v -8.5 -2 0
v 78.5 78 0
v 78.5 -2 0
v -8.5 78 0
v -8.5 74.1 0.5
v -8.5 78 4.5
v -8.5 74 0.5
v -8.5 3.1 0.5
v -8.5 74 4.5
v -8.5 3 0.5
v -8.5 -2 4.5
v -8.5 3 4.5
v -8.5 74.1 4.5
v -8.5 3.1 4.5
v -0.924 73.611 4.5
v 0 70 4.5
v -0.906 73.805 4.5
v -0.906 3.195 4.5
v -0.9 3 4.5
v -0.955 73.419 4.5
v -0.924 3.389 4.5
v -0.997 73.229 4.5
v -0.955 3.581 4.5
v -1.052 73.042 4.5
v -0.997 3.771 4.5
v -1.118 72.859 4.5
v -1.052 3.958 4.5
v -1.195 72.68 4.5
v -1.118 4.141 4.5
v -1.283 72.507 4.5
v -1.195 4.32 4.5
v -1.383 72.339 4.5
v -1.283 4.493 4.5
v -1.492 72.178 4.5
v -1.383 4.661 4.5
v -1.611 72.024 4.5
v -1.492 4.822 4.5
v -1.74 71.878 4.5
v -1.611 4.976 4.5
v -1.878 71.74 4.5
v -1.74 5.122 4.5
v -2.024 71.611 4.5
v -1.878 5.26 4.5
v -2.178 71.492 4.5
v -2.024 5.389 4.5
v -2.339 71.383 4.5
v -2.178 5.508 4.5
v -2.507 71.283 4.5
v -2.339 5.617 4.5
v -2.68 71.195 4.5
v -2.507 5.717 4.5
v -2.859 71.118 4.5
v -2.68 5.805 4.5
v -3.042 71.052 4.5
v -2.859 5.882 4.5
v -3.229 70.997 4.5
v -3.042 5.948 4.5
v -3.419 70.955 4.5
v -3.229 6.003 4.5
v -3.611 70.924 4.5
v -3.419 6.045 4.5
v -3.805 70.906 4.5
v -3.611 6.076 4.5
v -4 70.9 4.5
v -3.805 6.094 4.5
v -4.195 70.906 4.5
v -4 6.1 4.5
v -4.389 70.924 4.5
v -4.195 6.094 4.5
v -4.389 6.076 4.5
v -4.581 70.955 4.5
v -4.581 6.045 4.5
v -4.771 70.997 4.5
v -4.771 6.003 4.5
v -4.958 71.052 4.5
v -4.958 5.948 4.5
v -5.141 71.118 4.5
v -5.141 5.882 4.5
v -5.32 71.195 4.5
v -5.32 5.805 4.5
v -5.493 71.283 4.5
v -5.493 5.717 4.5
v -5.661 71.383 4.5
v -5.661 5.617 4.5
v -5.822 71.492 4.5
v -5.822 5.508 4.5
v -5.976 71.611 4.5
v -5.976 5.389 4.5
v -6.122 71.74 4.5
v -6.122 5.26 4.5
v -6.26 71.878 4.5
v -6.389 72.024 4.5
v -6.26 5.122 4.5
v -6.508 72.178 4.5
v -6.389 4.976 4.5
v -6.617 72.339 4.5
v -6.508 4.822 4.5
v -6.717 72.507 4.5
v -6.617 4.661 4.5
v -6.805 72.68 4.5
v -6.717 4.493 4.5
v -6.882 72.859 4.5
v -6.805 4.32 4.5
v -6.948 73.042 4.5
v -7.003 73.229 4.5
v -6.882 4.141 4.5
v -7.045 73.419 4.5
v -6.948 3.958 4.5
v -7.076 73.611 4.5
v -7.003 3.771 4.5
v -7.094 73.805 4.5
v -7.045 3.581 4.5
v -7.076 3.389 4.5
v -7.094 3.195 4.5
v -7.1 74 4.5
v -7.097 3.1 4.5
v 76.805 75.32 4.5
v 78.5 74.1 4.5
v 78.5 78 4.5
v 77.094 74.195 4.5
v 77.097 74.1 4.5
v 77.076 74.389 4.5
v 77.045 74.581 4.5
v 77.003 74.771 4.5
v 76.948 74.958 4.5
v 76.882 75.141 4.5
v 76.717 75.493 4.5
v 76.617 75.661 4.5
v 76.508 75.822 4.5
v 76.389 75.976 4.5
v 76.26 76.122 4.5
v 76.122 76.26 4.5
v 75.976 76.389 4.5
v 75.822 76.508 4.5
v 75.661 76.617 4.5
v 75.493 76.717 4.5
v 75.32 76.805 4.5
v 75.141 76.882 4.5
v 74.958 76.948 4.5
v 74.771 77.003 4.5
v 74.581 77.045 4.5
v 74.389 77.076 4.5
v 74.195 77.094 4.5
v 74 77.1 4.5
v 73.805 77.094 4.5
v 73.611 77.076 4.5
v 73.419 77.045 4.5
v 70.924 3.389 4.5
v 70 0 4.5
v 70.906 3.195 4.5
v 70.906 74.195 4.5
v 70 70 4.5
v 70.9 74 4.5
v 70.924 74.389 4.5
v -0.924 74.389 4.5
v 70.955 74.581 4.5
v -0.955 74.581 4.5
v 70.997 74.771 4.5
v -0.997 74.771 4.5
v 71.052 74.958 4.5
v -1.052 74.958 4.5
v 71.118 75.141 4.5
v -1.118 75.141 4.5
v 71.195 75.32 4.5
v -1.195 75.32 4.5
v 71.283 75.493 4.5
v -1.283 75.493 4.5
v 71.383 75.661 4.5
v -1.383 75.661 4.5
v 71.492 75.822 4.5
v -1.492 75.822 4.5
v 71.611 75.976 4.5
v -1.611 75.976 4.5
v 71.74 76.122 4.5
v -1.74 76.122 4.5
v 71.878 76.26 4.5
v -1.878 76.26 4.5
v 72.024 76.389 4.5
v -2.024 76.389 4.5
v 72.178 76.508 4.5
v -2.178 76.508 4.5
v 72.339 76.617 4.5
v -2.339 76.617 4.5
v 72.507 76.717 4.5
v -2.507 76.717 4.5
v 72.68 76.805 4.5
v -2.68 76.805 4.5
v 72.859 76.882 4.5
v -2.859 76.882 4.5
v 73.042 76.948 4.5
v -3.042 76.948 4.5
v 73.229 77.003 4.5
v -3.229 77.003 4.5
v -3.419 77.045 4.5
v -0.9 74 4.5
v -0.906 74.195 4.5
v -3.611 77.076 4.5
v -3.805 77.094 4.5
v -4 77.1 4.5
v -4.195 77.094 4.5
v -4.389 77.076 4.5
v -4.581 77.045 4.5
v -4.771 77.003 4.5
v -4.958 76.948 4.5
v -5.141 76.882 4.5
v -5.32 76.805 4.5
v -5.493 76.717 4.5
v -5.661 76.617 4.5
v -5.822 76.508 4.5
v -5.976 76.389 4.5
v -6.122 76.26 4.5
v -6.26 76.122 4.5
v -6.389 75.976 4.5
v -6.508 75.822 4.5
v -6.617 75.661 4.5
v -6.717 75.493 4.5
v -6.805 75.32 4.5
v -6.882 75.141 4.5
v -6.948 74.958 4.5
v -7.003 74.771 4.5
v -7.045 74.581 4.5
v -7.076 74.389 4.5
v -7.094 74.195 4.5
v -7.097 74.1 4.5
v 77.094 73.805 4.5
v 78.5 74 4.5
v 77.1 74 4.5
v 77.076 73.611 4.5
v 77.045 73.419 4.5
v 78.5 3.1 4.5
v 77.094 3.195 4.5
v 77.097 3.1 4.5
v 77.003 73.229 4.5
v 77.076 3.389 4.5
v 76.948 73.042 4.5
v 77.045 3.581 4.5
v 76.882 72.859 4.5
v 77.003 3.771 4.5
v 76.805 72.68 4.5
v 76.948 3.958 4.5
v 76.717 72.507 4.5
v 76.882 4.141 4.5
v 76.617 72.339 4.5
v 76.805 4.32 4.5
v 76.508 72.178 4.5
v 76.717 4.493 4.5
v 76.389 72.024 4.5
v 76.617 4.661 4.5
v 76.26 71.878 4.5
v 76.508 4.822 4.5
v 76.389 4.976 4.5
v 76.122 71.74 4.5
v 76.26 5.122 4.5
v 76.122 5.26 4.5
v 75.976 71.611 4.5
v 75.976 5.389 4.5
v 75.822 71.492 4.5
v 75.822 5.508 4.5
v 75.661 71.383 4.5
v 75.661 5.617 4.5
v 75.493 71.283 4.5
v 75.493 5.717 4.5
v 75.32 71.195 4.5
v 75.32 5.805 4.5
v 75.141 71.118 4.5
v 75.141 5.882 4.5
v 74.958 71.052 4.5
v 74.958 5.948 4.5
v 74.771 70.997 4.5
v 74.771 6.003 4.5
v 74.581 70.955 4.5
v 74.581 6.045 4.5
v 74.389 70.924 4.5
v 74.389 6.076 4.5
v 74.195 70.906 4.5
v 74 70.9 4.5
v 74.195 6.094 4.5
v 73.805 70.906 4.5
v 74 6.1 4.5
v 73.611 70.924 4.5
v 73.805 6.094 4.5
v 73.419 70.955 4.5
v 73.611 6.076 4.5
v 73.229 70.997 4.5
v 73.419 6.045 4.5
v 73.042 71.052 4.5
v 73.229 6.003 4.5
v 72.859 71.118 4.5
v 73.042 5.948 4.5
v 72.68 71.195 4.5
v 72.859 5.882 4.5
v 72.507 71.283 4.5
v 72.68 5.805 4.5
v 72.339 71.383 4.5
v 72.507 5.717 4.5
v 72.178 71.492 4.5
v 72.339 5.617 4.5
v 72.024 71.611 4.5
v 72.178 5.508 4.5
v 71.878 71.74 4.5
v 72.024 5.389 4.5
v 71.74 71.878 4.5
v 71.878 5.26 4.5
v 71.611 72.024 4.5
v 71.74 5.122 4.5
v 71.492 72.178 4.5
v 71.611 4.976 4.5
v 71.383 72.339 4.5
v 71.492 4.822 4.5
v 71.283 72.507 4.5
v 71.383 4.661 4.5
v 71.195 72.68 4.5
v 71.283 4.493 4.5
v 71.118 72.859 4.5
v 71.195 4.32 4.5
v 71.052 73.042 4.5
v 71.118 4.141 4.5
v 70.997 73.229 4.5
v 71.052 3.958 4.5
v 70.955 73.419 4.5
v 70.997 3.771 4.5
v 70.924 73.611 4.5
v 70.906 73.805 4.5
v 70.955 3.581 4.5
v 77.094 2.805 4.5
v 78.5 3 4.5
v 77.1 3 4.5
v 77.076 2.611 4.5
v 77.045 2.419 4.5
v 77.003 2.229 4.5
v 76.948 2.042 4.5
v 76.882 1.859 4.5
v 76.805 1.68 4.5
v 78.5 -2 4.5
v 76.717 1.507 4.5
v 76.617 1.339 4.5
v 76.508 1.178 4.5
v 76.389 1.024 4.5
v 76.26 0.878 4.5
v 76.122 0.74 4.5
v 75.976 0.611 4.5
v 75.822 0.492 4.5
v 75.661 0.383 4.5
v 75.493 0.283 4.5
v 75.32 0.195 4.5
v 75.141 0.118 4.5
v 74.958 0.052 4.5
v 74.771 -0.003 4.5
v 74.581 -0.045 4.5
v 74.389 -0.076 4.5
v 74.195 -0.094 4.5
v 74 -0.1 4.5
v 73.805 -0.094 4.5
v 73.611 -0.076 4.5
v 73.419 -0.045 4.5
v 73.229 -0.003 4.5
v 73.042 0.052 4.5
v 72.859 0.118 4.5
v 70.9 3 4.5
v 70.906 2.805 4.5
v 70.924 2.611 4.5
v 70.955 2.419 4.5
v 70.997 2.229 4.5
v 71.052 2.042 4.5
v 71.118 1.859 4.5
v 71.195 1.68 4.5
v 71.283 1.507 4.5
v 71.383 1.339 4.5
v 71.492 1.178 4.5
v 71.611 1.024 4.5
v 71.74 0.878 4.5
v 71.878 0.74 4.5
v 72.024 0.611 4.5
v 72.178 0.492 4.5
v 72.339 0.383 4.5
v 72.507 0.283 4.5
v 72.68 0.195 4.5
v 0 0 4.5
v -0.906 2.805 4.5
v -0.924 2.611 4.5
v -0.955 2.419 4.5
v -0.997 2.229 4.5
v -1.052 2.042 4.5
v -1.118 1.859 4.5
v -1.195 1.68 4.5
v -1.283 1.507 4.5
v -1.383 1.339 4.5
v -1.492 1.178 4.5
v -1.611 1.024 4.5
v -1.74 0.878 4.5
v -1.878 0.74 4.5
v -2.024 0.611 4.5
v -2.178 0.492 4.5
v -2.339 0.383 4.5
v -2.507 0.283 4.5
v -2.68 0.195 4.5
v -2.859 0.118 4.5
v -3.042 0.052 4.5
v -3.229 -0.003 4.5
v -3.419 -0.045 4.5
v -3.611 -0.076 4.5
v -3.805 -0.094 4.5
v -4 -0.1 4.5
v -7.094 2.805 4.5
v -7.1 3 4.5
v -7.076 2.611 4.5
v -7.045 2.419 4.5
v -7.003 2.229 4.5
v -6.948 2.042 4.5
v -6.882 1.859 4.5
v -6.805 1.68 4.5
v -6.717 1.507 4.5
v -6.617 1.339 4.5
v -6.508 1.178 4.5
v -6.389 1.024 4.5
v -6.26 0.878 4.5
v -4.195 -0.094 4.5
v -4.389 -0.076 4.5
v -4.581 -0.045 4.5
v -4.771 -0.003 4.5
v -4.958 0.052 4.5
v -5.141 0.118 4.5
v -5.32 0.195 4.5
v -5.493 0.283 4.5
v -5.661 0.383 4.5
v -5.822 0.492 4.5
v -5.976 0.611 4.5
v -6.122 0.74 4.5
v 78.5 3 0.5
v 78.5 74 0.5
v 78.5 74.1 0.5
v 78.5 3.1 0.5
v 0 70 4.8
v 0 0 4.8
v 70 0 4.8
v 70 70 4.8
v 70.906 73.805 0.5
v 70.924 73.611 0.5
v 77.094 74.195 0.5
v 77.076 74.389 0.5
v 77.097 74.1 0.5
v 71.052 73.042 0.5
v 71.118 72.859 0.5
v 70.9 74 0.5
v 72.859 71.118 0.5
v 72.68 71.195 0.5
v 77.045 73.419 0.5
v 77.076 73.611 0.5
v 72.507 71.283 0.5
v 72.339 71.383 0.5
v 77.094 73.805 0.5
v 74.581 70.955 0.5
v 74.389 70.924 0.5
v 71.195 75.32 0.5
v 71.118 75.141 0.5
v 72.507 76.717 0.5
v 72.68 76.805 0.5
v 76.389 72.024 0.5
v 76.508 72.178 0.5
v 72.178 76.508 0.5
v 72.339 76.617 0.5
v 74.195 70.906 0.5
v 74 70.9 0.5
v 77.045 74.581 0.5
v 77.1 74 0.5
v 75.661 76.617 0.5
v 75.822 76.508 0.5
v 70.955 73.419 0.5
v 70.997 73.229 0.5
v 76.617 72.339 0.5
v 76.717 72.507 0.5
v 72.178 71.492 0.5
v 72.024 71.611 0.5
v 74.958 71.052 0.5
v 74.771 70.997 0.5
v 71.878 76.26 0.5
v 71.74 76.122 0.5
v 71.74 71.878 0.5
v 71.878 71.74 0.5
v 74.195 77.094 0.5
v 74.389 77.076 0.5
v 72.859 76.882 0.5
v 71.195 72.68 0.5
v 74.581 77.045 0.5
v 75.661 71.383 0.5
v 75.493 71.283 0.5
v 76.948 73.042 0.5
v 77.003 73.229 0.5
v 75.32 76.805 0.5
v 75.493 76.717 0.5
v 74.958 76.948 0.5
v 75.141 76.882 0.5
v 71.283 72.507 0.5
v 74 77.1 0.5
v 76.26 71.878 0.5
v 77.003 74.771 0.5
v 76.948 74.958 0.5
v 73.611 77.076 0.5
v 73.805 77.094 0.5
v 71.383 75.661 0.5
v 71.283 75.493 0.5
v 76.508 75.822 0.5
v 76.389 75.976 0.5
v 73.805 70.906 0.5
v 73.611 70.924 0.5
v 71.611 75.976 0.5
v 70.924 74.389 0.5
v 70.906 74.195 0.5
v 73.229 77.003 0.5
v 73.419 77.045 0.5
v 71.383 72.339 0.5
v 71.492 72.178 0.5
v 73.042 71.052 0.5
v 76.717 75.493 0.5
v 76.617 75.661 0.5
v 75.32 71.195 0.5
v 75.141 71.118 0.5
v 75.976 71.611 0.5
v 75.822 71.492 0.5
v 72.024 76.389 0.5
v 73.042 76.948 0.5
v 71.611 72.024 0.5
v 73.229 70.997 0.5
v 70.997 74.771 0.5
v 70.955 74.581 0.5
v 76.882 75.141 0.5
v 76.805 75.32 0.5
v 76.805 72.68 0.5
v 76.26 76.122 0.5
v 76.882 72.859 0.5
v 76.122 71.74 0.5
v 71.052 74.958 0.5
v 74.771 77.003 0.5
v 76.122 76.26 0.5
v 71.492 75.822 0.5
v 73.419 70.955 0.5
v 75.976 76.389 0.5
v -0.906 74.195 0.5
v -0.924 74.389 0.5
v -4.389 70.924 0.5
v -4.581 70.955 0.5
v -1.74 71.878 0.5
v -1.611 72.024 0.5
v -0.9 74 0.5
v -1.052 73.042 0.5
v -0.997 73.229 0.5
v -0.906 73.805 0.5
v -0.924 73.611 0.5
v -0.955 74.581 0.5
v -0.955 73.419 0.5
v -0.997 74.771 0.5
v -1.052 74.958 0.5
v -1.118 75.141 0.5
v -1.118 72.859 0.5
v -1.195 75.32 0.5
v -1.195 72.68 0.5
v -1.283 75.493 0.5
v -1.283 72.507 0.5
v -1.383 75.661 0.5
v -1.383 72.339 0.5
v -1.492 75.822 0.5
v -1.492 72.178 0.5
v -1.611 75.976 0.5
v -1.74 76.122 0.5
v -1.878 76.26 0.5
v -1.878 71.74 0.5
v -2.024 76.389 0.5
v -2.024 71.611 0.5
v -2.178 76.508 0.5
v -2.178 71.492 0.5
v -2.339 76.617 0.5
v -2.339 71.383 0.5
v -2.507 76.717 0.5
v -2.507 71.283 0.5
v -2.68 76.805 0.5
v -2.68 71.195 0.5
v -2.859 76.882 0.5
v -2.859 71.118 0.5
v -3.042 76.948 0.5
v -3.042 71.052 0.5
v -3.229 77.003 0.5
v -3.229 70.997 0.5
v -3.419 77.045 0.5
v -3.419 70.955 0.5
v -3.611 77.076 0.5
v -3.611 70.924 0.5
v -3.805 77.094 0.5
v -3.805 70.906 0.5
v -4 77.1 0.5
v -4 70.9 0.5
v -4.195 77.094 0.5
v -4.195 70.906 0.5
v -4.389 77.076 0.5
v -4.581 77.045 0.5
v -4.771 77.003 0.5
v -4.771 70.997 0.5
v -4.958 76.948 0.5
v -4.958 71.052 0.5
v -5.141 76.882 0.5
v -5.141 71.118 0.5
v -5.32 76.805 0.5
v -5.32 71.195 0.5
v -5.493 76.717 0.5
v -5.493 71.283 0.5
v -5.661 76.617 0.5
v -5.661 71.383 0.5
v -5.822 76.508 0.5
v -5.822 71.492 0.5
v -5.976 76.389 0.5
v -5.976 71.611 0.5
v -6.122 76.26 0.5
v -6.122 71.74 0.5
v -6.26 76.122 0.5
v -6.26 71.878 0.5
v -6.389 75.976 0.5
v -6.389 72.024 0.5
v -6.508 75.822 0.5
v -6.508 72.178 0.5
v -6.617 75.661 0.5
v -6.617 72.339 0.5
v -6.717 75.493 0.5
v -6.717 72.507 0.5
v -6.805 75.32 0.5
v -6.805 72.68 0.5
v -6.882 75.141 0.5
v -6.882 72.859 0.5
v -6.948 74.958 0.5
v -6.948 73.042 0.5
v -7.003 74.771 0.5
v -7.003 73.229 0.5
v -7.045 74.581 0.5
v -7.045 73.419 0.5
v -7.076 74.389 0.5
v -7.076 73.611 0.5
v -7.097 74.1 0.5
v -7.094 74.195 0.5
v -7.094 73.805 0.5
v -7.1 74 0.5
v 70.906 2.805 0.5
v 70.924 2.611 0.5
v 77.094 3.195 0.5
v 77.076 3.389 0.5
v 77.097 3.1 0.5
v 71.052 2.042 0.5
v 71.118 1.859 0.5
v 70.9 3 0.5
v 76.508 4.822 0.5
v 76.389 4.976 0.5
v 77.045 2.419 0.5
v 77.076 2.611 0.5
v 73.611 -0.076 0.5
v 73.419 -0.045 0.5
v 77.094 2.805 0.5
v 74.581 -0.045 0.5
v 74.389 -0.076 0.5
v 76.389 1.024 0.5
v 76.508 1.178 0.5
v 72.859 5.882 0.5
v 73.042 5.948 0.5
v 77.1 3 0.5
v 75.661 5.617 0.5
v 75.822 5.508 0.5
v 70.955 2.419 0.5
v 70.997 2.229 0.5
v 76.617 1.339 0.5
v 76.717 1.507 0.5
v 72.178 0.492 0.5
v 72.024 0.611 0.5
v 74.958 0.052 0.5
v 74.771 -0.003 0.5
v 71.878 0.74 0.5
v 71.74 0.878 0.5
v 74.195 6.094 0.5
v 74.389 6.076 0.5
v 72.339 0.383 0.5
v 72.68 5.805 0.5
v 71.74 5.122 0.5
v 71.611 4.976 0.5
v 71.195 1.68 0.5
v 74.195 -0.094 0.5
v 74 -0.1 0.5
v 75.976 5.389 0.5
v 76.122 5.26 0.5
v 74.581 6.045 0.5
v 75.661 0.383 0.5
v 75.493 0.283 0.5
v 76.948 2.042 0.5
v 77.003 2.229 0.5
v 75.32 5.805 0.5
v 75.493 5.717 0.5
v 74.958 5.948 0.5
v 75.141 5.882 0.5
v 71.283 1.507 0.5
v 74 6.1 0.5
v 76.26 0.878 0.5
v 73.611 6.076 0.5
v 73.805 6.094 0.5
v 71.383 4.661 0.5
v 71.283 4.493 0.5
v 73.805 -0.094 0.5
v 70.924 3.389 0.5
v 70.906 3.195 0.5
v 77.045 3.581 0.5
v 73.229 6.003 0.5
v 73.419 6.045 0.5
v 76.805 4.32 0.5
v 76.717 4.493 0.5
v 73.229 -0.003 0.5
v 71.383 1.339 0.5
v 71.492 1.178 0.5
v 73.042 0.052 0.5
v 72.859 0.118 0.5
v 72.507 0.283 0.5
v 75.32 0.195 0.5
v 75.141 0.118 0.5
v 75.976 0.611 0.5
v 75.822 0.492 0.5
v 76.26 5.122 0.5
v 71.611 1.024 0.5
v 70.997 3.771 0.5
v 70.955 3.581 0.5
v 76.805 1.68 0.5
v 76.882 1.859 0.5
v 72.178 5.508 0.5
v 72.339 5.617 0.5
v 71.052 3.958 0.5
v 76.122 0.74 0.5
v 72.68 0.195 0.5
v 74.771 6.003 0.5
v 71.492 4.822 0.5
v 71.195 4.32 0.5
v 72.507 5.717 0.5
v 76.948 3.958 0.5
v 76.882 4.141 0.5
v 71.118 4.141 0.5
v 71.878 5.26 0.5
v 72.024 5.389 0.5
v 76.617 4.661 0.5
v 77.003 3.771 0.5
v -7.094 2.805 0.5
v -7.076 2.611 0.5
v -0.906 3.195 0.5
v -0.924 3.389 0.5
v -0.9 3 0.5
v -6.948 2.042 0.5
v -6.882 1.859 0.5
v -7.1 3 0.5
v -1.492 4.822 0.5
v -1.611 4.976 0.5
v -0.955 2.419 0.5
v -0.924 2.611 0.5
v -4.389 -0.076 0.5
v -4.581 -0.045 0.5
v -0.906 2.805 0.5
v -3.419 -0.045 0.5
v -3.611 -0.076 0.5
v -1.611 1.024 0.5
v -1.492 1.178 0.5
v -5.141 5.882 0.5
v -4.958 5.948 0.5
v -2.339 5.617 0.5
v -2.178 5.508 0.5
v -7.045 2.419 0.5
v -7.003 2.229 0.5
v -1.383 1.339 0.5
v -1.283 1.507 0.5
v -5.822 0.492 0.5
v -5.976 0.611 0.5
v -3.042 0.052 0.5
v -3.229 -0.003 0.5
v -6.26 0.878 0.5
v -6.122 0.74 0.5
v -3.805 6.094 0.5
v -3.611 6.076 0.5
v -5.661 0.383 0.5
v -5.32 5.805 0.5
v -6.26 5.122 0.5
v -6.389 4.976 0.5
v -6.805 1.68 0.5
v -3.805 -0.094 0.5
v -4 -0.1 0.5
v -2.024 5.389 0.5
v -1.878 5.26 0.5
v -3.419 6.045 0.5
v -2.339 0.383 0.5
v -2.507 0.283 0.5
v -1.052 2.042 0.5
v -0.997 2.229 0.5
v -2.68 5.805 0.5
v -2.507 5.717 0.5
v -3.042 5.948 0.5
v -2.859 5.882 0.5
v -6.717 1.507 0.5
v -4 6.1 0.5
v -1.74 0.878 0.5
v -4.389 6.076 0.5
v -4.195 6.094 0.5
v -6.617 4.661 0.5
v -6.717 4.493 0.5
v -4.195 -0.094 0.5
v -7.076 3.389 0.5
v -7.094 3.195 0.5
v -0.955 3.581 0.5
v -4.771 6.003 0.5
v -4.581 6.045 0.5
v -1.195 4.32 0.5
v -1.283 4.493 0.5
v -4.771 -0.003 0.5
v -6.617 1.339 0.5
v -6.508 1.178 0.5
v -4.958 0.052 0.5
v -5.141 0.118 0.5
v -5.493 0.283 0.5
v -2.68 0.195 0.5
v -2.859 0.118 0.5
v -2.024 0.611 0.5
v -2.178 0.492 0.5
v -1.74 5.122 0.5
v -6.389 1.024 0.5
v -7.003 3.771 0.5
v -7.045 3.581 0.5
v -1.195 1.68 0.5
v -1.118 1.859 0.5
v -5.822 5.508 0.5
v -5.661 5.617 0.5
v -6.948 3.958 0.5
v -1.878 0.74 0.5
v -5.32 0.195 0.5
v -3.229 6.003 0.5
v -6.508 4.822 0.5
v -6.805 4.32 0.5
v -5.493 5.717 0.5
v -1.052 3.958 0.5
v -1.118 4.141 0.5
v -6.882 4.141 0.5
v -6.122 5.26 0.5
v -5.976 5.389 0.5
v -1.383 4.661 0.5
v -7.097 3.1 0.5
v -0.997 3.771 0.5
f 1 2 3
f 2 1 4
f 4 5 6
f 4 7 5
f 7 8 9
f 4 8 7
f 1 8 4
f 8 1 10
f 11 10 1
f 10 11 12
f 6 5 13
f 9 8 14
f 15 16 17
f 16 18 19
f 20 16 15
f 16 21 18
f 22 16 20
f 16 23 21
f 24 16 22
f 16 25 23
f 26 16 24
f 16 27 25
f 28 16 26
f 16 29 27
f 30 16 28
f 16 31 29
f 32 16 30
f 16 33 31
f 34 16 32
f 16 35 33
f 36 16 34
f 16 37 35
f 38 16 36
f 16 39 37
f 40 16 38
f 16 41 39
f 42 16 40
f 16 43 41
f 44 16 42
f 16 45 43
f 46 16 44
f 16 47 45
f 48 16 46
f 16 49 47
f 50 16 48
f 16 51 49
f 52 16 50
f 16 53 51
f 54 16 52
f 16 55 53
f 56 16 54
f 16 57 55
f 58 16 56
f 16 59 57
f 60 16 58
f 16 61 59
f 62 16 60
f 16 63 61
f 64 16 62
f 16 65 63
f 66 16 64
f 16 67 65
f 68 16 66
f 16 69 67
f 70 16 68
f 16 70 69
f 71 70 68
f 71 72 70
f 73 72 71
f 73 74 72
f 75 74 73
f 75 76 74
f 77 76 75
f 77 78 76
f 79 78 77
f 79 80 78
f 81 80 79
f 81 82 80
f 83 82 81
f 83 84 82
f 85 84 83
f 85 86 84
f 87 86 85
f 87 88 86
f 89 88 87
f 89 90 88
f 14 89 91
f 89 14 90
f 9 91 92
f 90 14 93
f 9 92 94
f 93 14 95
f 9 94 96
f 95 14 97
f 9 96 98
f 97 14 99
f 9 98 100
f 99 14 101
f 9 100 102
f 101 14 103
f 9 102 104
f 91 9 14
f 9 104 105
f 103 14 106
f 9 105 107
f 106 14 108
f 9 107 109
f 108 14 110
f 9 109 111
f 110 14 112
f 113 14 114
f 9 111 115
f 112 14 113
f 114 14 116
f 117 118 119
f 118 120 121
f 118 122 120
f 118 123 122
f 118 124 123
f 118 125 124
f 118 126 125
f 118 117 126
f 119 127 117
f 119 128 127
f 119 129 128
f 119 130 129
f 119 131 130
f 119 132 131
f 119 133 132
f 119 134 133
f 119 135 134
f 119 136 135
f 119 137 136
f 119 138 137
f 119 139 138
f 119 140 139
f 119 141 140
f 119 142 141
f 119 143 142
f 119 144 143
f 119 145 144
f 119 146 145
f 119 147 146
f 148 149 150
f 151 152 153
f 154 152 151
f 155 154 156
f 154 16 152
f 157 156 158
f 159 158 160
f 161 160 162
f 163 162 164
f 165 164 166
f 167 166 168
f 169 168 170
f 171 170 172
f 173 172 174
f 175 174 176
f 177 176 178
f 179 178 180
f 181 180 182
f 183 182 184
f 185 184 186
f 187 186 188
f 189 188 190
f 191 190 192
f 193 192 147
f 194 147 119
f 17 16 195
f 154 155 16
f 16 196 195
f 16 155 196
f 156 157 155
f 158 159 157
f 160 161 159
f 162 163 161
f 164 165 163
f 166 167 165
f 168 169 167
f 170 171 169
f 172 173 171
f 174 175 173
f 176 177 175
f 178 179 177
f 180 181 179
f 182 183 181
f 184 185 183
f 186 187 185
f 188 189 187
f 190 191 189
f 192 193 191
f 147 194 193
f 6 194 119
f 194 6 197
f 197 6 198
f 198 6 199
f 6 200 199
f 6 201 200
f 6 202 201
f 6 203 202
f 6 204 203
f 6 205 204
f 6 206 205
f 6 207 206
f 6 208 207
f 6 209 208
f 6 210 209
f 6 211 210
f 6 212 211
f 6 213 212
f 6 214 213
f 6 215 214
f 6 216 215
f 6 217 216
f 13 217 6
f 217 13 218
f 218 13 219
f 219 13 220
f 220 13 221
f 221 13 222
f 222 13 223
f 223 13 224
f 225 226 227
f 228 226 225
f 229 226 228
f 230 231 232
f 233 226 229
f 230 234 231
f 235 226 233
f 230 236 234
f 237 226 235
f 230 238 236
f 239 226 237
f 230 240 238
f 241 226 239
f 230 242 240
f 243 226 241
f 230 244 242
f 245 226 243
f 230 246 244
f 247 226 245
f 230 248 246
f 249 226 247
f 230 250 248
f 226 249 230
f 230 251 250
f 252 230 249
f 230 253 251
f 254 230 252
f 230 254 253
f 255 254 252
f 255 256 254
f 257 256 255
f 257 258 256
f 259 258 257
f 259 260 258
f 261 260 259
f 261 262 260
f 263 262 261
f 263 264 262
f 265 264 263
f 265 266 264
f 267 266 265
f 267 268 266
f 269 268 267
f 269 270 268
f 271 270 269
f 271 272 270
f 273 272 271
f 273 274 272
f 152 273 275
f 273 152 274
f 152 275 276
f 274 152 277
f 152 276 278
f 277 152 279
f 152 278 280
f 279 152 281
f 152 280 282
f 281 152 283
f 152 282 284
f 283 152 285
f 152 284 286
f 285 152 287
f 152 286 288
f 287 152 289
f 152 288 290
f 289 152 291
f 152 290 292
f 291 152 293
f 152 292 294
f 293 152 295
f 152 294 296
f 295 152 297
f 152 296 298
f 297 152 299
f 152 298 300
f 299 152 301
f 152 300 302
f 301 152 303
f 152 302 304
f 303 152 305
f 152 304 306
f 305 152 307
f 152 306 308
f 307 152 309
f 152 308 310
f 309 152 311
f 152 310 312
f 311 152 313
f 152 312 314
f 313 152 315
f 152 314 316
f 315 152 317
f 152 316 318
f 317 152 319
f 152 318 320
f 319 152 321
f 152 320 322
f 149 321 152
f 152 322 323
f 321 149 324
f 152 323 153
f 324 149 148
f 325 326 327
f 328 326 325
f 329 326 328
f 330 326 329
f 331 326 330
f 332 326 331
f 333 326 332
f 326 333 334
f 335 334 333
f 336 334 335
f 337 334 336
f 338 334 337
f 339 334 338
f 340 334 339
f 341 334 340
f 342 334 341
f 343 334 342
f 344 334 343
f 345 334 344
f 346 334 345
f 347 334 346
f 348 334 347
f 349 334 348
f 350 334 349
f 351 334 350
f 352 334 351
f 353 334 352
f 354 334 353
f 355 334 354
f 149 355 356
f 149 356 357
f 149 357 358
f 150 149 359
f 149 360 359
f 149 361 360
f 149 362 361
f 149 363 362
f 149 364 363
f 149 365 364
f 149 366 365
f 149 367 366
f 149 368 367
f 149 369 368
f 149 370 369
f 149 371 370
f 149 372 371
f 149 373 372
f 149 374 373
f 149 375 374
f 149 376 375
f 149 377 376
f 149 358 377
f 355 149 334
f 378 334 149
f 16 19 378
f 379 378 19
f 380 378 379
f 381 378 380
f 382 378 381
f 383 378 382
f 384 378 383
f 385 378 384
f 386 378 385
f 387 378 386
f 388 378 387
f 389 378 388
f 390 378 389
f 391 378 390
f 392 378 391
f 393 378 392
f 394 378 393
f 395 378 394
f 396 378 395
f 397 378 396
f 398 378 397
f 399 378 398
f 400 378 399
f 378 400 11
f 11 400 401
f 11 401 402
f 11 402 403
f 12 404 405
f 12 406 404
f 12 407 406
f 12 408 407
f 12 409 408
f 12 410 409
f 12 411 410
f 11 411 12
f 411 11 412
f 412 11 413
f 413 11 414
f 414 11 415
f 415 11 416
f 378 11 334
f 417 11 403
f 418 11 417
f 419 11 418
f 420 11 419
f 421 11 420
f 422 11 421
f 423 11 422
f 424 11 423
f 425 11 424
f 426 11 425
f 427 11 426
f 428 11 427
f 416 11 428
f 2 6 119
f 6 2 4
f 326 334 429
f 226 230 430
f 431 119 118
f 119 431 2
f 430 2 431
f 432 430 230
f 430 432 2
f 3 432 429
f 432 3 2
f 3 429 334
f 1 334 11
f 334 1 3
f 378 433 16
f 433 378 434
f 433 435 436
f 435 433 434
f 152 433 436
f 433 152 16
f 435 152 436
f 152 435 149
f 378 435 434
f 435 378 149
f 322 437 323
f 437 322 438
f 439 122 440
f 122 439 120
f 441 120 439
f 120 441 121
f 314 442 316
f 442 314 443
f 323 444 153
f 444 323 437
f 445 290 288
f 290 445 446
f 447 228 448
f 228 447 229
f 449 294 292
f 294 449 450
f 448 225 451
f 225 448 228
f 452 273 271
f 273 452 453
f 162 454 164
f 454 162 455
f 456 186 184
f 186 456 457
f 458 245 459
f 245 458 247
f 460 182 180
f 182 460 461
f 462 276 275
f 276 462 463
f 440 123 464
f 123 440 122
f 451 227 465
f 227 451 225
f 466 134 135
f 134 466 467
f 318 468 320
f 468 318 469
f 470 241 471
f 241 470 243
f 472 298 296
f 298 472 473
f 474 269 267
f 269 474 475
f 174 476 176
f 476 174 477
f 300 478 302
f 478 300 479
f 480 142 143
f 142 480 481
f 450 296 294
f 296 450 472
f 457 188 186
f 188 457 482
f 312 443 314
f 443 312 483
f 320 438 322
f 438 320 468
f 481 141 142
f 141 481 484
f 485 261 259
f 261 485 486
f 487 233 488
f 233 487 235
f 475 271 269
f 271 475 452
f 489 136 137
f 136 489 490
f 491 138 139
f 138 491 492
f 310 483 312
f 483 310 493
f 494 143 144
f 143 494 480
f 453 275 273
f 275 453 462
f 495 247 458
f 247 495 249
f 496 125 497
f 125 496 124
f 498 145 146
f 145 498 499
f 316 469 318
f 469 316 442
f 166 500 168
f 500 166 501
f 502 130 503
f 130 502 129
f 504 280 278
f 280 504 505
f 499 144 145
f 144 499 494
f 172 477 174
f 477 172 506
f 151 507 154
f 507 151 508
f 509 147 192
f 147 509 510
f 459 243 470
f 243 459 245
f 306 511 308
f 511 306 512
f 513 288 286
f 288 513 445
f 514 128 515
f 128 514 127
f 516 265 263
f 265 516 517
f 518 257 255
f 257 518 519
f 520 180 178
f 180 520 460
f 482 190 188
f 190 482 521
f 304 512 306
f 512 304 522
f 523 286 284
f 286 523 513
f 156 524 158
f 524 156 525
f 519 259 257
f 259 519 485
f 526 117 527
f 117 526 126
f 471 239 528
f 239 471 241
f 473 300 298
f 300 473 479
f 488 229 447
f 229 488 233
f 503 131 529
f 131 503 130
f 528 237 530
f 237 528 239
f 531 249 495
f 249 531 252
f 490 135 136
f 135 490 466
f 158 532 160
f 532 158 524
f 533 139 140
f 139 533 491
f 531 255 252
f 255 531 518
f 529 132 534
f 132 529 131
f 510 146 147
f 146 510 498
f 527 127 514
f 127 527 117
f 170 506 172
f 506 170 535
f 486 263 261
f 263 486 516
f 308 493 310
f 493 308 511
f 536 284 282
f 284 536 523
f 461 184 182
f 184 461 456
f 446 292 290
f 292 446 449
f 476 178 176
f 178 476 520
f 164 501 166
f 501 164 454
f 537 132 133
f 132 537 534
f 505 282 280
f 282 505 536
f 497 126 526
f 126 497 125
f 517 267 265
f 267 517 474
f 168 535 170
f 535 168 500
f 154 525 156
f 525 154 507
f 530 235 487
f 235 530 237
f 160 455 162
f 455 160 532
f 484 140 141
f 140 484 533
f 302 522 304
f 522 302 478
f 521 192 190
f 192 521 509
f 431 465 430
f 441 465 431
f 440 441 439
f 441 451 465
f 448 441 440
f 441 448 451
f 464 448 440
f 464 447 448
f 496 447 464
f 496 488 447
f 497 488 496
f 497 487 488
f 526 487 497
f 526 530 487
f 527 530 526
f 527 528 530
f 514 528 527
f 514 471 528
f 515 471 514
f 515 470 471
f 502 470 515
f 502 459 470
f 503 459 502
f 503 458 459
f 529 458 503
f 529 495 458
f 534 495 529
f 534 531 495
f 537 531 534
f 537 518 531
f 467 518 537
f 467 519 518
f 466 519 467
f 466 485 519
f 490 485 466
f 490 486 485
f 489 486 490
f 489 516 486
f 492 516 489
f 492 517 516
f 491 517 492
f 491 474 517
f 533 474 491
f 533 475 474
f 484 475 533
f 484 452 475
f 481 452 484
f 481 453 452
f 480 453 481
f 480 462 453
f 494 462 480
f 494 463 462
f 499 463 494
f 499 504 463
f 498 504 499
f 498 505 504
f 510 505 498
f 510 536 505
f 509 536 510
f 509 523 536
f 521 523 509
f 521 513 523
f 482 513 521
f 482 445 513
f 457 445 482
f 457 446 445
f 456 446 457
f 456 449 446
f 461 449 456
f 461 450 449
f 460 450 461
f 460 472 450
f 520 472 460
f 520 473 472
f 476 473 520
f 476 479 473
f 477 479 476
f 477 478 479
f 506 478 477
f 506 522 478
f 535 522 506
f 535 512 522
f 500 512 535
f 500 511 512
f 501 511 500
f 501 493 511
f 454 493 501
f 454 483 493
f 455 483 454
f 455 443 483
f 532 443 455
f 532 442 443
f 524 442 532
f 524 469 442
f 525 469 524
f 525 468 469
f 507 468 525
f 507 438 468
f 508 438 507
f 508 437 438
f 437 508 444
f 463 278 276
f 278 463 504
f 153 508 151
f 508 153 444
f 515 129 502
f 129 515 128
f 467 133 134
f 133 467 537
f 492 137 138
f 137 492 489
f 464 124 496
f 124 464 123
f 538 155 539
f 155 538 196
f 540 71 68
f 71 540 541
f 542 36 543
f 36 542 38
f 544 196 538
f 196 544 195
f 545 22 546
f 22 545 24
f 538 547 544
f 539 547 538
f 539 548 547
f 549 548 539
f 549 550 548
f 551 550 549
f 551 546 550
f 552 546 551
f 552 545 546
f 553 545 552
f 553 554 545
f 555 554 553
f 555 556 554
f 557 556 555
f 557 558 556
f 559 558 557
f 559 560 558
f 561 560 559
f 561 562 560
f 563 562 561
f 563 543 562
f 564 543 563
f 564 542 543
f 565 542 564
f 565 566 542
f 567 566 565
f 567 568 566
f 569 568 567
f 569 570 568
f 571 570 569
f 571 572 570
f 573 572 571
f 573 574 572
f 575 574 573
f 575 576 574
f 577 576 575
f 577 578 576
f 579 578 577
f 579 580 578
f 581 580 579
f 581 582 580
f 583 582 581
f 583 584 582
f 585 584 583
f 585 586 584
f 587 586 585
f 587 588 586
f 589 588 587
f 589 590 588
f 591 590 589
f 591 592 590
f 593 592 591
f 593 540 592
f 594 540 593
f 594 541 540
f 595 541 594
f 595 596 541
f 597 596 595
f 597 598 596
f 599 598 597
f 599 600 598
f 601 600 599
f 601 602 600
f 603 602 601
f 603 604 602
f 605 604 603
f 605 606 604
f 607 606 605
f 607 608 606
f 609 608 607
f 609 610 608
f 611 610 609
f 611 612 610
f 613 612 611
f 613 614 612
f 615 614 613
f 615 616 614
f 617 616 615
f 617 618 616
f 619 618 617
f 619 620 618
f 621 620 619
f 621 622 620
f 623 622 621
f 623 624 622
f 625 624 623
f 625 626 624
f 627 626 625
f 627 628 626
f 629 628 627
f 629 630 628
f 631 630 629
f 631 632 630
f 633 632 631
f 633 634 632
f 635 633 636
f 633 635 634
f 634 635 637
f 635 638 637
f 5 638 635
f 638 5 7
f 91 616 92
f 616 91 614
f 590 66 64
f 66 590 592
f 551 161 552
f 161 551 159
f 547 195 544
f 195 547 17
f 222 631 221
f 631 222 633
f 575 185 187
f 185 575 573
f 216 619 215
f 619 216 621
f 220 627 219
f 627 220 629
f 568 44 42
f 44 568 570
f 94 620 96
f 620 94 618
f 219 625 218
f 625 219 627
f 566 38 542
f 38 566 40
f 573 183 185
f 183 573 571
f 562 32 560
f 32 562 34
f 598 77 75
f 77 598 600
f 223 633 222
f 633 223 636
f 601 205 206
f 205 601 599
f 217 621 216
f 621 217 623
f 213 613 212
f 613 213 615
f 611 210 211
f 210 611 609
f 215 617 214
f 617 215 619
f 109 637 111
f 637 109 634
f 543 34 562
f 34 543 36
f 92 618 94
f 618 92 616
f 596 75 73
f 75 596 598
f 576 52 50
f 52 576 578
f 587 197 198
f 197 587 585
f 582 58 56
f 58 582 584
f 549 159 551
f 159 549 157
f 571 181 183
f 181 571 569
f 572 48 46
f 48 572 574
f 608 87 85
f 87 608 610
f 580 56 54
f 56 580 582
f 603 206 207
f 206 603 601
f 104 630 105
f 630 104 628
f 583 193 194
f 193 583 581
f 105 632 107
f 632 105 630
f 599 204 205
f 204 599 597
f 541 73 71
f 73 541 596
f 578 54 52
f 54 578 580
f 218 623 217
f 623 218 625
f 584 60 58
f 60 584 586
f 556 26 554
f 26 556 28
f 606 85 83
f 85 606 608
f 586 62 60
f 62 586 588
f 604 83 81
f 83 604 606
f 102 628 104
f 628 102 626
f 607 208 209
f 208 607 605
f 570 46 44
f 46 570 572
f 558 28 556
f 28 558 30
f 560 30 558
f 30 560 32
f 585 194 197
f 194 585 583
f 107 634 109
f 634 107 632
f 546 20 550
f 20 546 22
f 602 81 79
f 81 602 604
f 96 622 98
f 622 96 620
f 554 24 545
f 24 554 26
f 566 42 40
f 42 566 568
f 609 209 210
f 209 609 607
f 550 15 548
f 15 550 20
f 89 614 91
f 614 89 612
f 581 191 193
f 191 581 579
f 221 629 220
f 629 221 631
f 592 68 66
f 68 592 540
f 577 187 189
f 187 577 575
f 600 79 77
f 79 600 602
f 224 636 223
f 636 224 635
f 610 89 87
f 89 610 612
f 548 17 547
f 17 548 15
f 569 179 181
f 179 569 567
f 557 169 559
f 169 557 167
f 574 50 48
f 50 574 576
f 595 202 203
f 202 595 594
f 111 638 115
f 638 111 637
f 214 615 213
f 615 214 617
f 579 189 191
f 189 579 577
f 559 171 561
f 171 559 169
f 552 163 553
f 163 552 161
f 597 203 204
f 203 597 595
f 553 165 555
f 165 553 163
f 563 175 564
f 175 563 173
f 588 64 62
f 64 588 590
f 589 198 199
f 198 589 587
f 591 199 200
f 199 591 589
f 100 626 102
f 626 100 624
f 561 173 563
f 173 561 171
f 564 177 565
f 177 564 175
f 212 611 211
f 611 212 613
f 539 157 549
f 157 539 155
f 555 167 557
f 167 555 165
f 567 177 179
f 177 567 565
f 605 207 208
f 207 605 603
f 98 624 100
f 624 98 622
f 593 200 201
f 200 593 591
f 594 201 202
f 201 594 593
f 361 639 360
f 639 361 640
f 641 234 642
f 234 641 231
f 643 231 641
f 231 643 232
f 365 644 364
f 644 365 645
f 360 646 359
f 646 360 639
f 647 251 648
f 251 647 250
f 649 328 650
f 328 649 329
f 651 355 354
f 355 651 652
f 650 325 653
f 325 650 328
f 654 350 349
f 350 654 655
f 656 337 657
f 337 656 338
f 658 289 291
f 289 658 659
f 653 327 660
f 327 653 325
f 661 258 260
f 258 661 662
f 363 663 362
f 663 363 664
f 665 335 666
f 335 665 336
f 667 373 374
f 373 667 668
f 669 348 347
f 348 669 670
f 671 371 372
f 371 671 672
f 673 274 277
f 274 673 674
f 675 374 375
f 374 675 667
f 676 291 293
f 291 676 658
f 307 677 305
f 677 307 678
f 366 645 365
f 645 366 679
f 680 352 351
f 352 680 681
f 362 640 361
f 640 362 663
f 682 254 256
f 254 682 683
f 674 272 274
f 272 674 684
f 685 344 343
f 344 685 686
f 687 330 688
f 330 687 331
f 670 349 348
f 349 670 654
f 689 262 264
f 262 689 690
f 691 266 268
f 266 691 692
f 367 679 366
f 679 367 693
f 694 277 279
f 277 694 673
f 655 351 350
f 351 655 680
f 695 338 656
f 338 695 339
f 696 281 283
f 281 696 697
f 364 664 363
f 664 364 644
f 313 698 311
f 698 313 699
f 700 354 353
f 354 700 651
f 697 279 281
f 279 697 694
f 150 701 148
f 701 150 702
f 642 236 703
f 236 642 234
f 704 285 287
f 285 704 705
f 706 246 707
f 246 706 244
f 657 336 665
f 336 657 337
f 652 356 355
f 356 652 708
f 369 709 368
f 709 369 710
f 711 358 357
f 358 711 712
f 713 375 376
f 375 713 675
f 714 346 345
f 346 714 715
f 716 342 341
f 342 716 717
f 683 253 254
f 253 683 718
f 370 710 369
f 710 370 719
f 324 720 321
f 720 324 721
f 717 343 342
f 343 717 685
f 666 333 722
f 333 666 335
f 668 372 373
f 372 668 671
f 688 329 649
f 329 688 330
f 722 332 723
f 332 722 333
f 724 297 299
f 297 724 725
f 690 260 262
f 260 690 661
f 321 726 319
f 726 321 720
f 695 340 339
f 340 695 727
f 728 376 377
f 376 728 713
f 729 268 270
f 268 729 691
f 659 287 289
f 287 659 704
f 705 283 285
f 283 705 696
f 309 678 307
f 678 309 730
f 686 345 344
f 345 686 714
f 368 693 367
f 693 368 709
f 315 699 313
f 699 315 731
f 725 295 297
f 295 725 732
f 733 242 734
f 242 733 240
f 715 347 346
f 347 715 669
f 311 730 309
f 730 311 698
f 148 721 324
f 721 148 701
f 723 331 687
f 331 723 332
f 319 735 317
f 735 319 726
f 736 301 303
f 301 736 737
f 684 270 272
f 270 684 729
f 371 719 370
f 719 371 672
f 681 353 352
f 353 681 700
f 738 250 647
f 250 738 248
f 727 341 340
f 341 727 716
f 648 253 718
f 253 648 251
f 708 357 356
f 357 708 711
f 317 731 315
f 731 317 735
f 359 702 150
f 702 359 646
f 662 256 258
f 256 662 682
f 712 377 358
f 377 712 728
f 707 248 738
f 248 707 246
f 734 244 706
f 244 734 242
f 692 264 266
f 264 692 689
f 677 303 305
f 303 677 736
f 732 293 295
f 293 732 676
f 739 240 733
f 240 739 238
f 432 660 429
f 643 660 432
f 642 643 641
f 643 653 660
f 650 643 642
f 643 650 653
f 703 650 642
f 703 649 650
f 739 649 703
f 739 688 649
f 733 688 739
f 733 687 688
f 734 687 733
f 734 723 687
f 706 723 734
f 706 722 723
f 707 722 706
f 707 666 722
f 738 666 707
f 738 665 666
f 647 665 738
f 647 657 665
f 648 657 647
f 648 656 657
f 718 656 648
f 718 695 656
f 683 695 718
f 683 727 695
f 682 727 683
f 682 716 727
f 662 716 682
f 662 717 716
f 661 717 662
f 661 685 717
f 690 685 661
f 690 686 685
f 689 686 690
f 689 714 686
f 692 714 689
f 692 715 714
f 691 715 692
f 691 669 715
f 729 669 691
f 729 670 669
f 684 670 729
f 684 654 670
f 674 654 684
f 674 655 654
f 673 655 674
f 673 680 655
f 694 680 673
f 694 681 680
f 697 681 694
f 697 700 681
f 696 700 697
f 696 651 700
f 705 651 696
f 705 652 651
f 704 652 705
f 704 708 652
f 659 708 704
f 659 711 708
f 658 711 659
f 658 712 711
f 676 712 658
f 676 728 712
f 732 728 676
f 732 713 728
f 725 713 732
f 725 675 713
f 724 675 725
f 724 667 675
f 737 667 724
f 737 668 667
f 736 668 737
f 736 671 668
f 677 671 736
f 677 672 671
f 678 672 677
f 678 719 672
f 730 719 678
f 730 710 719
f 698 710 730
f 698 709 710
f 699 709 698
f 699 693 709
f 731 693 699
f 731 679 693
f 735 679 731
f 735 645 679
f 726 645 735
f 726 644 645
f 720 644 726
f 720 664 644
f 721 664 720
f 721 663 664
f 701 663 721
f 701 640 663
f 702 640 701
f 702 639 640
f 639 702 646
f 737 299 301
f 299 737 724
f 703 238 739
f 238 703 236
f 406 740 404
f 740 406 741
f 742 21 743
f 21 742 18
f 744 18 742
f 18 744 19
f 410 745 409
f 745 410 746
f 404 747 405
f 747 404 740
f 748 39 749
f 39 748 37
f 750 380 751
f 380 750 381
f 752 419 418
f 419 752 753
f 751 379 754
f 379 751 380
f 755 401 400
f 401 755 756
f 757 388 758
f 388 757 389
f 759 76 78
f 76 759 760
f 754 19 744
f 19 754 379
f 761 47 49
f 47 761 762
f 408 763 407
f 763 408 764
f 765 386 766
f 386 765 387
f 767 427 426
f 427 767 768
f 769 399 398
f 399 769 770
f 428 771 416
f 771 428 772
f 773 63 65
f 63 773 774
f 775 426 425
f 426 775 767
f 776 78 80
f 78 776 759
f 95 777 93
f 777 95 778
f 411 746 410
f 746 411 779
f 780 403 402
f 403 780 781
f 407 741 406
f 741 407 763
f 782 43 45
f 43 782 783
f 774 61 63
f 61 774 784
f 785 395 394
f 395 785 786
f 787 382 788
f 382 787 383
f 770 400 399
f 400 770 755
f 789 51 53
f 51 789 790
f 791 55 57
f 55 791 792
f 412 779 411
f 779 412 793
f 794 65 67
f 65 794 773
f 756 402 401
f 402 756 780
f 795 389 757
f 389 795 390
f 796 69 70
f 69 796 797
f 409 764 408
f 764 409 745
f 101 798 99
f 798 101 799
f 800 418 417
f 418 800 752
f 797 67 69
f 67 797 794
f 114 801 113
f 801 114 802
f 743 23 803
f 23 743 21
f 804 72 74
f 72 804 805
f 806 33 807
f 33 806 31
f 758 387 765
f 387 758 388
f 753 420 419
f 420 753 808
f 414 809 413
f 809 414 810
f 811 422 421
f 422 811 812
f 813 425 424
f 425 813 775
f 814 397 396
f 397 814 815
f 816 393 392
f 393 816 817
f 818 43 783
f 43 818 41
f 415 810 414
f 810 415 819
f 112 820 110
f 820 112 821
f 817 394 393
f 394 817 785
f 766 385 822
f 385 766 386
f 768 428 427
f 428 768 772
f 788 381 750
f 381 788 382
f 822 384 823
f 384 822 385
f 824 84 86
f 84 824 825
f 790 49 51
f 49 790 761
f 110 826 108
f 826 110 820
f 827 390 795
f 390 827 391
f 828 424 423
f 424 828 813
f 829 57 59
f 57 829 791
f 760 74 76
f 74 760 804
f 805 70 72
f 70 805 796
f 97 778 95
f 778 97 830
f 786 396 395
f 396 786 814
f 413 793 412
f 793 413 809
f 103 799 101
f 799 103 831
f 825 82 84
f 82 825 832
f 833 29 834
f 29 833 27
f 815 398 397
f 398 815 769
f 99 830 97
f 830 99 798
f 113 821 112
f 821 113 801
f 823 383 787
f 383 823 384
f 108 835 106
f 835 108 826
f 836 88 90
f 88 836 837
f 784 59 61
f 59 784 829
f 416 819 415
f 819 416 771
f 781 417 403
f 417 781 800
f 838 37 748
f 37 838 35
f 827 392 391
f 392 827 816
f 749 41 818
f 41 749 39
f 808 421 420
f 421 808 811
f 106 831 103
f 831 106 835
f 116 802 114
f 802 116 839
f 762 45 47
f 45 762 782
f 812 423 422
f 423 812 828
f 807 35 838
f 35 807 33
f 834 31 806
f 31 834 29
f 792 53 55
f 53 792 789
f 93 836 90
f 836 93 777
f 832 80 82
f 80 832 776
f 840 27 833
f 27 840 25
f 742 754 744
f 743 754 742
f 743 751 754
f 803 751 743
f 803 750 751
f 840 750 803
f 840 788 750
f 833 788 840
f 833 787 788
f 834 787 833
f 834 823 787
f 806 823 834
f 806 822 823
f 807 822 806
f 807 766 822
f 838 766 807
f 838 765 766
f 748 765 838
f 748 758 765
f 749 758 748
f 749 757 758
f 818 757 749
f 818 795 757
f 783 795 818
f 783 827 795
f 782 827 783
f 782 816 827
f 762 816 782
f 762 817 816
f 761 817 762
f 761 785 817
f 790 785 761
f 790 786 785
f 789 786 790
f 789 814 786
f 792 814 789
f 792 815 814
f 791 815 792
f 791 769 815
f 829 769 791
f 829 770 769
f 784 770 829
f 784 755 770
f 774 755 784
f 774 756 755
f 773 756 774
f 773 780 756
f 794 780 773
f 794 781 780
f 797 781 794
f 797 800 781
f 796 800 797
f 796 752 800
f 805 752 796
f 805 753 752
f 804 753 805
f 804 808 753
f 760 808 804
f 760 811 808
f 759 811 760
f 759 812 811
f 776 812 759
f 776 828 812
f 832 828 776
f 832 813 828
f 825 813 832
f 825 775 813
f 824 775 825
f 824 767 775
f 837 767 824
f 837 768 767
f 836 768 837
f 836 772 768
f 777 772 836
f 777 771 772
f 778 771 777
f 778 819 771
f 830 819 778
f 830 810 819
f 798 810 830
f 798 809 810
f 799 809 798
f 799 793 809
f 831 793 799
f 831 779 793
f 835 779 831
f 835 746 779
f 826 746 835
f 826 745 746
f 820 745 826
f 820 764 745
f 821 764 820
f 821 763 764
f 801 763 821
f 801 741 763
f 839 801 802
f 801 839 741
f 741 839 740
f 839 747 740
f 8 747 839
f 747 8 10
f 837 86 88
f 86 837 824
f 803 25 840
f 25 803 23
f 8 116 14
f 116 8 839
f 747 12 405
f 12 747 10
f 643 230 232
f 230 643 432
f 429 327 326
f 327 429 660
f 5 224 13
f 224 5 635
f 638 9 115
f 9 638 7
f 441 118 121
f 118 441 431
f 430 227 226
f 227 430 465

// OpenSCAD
difference() {
    union() {
        // 背中側
        color("black") translate([-8.5,-2,0]) linear_extrude(4.5) square([87,80]);
        // くり抜く領域
    color("lightgreen") union() {
        translate([0,0,0]) linear_extrude(4.8) square([70,70]);
    }
    }
    // 磁石穴
    union() {
        translate([74,74,0.5]) linear_extrude(4) circle(3.1,$fn=100);
        translate([-4,74,0.5]) linear_extrude(4) circle(3.1,$fn=100);
        translate([74,3,0.5]) linear_extrude(4) circle(3.1,$fn=100);
        translate([-4,3,0.5]) linear_extrude(4) circle(3.1,$fn=100);
    }
    // 溝
    color("purple") union() {
        translate([-9,3,0.5]) linear_extrude(4) square([5,0.1]);
        translate([74,3,0.5]) linear_extrude(4) square([5,0.1]);
        translate([-9,74,0.5]) linear_extrude(4) square([5,0.1]);
        translate([74,74,0.5]) linear_extrude(4) square([5,0.1]);
    }
}
